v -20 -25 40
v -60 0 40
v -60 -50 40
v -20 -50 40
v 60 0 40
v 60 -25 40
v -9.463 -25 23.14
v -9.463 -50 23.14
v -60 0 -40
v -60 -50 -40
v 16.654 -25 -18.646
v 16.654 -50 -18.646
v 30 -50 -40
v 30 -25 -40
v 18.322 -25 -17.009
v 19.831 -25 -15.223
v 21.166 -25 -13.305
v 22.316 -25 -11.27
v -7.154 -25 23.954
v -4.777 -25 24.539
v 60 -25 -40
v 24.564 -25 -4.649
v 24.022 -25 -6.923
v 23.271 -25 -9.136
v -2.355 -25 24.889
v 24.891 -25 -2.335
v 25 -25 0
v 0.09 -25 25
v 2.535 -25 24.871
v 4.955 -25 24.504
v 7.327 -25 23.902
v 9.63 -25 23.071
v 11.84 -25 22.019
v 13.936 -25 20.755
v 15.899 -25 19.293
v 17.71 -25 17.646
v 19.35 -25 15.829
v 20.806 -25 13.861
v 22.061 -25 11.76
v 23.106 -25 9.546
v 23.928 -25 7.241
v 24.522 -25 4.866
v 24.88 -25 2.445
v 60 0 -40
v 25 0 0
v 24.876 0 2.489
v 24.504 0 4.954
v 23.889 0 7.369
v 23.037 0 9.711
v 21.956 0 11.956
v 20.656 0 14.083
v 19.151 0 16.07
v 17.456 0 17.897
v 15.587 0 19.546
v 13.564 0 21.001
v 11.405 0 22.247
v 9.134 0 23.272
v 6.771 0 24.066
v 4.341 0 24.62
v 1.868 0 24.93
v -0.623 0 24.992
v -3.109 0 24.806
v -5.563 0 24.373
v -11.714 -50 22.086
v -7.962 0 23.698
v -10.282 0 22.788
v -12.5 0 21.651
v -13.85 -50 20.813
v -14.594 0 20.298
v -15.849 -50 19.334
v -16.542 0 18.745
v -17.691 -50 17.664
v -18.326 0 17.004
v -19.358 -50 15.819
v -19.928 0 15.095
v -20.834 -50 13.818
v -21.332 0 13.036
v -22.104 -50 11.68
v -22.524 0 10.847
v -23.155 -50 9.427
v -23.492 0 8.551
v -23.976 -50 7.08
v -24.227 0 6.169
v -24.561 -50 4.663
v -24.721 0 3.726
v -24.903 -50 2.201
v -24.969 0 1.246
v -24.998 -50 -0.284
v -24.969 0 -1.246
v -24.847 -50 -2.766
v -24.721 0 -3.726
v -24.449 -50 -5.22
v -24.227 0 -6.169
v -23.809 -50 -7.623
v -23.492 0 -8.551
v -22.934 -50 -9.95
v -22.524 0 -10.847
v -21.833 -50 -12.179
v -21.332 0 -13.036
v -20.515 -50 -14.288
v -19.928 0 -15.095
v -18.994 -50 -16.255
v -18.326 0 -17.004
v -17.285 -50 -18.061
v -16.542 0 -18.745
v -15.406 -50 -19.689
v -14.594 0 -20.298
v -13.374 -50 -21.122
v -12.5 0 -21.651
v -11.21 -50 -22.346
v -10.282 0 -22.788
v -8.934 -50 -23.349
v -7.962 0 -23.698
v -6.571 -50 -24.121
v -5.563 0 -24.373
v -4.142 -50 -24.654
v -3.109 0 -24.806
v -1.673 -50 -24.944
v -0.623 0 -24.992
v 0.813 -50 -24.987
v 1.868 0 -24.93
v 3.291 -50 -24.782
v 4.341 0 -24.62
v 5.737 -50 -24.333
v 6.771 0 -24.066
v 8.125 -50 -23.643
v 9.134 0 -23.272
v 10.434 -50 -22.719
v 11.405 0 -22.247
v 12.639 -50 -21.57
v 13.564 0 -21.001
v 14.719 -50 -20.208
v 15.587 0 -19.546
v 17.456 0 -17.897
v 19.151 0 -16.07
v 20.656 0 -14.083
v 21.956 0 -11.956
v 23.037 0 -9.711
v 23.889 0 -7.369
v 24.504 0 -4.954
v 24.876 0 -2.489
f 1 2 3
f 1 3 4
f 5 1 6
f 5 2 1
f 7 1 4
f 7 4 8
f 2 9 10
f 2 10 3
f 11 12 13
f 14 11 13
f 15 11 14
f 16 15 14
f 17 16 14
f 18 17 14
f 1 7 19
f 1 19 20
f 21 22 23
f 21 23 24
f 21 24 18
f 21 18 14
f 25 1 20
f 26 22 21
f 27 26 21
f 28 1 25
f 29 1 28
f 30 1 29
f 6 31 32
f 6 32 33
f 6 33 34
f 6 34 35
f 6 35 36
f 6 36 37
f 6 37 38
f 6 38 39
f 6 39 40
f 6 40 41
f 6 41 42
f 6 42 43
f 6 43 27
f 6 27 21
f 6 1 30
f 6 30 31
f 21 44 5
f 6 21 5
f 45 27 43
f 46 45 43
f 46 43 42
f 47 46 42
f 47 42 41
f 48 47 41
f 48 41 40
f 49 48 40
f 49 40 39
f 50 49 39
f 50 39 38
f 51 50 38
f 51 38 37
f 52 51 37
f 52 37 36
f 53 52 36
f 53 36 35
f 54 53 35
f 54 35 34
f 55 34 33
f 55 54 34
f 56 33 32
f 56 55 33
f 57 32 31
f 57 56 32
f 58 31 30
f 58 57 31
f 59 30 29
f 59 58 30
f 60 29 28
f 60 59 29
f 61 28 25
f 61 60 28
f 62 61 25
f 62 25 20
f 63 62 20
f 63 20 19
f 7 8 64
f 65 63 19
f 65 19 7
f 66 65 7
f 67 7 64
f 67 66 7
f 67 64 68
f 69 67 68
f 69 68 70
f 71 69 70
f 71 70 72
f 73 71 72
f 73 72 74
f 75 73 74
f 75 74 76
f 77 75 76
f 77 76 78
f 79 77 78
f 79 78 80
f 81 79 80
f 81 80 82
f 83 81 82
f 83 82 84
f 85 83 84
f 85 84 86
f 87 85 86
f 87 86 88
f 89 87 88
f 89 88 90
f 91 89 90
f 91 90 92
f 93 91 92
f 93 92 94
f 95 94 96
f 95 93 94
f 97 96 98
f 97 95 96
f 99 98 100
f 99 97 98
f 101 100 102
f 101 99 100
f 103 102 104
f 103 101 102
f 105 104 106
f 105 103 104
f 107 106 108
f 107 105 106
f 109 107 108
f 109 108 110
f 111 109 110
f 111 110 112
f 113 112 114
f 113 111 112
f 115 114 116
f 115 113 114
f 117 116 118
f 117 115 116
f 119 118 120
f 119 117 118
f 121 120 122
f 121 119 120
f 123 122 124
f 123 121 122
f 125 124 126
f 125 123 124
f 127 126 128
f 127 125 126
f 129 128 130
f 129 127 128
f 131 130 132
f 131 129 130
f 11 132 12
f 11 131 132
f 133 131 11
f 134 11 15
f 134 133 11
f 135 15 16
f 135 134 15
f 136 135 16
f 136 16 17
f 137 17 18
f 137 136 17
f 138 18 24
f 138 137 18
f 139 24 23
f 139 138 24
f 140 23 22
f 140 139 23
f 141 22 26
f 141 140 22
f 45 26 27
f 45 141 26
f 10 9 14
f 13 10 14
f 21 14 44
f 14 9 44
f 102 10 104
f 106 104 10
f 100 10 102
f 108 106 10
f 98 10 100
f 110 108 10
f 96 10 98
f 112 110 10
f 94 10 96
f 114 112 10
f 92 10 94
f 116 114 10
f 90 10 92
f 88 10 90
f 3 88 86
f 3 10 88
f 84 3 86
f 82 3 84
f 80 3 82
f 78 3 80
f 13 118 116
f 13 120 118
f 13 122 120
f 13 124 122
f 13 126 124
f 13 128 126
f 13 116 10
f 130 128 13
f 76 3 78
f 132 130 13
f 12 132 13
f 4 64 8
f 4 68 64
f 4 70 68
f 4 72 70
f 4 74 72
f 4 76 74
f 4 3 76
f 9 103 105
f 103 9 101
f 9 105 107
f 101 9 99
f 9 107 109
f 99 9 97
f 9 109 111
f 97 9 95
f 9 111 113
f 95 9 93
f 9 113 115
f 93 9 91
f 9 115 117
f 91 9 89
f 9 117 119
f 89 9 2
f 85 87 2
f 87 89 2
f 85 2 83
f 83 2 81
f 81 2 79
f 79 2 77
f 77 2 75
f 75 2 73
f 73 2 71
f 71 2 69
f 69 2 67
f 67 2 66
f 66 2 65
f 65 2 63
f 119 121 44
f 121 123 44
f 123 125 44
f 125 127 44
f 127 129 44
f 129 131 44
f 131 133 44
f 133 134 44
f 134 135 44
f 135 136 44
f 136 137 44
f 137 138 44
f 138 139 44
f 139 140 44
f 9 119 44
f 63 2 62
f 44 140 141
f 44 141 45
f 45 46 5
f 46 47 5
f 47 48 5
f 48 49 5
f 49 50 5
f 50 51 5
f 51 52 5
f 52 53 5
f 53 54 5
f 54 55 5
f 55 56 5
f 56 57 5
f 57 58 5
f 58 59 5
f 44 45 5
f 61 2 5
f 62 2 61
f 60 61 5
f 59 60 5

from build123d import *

# Parameters (mm, degrees)
F0_W     = 120
F0_H     = 80
F0_R     = 25
F1_DEPTH = 50
F3_DEPTH = 25


with BuildPart() as f1:
    # F0 (on Front) → F1 (new body)
    with BuildSketch(Plane.XZ):
        Rectangle(F0_W, F0_H)
        Circle(F0_R, mode=Mode.SUBTRACT)
    extrude(amount=F1_DEPTH)

    # F2 (on face) → F3 (cut)
    with BuildSketch(Plane.XZ.offset(50)):
        Polygon((60, -40), (60, 40), (-20, 40), (30, -40), align=None)
    extrude(amount=-F3_DEPTH, mode=Mode.SUBTRACT)


solid = f1.part
